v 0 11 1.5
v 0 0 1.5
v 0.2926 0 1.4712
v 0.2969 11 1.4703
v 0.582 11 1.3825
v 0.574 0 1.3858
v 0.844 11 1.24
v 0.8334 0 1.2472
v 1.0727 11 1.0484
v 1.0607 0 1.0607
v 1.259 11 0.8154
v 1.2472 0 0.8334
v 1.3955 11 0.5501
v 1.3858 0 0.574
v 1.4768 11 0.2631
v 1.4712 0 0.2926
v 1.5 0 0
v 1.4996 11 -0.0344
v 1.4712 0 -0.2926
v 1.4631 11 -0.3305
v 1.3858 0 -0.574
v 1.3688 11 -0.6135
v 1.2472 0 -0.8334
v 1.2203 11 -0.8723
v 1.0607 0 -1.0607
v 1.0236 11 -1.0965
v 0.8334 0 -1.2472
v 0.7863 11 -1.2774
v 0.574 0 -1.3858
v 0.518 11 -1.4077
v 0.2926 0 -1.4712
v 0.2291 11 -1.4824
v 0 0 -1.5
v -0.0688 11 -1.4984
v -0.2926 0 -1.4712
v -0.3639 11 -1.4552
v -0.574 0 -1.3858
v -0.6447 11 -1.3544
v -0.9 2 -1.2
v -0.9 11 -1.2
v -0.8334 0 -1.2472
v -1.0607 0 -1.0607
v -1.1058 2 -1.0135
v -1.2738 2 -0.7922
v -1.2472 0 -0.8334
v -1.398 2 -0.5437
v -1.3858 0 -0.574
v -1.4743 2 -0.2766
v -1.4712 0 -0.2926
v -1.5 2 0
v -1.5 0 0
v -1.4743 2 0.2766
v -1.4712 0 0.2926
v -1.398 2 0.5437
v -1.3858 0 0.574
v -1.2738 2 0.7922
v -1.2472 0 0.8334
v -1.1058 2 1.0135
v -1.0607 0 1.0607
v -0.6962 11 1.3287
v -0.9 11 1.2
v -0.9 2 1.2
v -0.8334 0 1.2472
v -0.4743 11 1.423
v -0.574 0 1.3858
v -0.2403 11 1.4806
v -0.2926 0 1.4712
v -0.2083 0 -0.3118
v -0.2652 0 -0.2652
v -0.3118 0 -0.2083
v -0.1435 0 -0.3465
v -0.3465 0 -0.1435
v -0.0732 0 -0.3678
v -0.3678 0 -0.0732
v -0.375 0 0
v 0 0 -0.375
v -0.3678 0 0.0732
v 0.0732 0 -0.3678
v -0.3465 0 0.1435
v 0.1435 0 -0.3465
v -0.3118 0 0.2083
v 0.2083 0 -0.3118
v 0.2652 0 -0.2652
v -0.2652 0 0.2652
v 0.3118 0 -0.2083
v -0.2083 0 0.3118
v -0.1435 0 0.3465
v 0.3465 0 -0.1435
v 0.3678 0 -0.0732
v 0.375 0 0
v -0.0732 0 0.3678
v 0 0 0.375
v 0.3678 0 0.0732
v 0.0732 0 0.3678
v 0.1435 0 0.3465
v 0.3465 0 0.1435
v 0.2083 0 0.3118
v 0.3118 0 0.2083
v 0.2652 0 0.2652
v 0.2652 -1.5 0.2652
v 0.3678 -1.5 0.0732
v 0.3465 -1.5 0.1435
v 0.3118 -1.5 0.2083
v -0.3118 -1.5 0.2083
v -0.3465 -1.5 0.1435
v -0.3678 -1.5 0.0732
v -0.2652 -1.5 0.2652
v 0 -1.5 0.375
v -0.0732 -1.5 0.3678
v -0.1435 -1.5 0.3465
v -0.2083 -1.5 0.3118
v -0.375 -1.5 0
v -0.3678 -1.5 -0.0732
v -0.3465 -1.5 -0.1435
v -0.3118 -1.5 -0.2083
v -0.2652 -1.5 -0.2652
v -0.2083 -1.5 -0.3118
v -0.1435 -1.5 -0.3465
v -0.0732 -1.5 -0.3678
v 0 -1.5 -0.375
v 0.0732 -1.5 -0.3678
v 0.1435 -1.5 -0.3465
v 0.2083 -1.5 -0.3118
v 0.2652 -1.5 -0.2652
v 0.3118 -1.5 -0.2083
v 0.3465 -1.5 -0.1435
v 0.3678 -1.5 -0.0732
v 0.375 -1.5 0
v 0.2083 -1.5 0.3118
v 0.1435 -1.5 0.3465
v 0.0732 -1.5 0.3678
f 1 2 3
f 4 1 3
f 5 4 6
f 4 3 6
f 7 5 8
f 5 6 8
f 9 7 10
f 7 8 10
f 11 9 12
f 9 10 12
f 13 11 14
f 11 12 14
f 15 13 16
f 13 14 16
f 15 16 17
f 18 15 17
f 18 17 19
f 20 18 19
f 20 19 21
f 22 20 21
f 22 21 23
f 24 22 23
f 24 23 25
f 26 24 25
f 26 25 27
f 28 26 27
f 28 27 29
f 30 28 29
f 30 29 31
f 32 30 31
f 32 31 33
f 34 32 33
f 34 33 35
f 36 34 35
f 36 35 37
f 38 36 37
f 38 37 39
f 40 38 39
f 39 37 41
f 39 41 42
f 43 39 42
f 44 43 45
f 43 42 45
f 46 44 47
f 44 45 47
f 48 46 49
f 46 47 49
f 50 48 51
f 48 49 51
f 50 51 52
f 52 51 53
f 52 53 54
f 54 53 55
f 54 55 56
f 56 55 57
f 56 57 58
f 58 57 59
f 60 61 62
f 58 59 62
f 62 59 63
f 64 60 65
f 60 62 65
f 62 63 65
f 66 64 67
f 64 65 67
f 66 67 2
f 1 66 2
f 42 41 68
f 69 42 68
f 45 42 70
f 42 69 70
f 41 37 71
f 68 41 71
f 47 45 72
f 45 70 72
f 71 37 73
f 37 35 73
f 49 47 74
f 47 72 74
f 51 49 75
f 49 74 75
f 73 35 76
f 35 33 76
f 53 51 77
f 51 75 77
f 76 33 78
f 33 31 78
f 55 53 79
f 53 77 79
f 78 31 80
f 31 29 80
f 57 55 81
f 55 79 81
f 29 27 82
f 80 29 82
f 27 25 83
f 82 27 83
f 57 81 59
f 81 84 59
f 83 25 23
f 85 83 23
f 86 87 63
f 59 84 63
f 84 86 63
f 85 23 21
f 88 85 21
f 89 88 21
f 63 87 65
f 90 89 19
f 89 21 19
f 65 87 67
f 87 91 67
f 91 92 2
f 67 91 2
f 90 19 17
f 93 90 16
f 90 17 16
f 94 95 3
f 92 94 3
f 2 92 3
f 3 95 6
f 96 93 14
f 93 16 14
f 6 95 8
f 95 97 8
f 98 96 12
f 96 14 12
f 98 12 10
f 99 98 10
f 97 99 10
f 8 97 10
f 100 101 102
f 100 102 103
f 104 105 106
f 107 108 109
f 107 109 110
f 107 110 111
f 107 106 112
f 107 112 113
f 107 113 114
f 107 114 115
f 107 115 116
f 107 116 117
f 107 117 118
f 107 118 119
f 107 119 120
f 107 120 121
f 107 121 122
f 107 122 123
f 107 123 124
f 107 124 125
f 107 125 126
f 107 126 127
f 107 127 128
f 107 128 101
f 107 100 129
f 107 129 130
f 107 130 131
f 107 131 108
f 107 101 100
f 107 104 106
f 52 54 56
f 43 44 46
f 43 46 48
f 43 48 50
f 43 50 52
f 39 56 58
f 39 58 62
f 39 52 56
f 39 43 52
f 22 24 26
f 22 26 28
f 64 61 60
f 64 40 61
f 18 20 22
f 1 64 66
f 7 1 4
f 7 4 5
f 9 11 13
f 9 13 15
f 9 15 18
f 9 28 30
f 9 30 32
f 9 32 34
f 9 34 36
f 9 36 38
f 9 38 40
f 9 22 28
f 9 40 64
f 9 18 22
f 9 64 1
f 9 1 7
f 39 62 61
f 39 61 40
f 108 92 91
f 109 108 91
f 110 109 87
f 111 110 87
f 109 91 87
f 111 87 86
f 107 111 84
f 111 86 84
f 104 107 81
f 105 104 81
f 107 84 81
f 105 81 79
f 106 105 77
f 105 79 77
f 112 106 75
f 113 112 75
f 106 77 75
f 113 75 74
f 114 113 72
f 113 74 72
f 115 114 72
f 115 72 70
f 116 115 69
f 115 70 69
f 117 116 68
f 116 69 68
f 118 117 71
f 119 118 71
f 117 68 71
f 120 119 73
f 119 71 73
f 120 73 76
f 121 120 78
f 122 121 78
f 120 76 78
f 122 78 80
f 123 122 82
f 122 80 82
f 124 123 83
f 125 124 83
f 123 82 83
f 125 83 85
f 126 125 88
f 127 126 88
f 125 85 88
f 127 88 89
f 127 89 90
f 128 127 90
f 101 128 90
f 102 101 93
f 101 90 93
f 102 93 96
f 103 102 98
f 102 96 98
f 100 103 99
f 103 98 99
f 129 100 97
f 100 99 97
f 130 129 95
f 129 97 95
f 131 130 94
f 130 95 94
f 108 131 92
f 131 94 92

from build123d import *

# Parameters (mm, degrees)
SKETCH_1_R          = 1.5
EXTRUDE_1_DEPTH     = 11
CUT_EXTRUDE_START   = -9
CUT_EXTRUDE_1_DEPTH = 9
SKETCH_3_R          = 0.375
EXTRUDE_2_DEPTH     = 1.5


with BuildPart() as part:
    # Эскиз1 → Бобышка-Вытянуть1 (new body)
    with BuildSketch(Plane(origin=(0, 0, 0), x_dir=(1, 0, 0), z_dir=(0, 1, 0))):
        with Locations(Location((0, 0, 0), (0, 0, 270))):
            Circle(SKETCH_1_R)
    extrude(amount=EXTRUDE_1_DEPTH)

    # Эскиз2 → Вырез-Вытянуть1 (cut)
    with BuildSketch(Plane(origin=(0, 11, 0), x_dir=(1, 0, 0), z_dir=(0, 1, 0)).offset(CUT_EXTRUDE_START)):
        with BuildLine():
            Line((-0.9, -1.2), (-0.9, 1.2))
            ThreePointArc((-0.9, 1.2), (-1.5, 0), (-0.9, -1.2))
        make_face()
    extrude(amount=CUT_EXTRUDE_1_DEPTH, mode=Mode.SUBTRACT)

    # Эскиз3 → Бобышка-Вытянуть2 (add)
    with BuildSketch(Plane.XZ):
        with Locations(Location((0, 0, 0), (0, 0, 90))):
            Circle(SKETCH_3_R)
    extrude(amount=EXTRUDE_2_DEPTH)


solid = part.part
